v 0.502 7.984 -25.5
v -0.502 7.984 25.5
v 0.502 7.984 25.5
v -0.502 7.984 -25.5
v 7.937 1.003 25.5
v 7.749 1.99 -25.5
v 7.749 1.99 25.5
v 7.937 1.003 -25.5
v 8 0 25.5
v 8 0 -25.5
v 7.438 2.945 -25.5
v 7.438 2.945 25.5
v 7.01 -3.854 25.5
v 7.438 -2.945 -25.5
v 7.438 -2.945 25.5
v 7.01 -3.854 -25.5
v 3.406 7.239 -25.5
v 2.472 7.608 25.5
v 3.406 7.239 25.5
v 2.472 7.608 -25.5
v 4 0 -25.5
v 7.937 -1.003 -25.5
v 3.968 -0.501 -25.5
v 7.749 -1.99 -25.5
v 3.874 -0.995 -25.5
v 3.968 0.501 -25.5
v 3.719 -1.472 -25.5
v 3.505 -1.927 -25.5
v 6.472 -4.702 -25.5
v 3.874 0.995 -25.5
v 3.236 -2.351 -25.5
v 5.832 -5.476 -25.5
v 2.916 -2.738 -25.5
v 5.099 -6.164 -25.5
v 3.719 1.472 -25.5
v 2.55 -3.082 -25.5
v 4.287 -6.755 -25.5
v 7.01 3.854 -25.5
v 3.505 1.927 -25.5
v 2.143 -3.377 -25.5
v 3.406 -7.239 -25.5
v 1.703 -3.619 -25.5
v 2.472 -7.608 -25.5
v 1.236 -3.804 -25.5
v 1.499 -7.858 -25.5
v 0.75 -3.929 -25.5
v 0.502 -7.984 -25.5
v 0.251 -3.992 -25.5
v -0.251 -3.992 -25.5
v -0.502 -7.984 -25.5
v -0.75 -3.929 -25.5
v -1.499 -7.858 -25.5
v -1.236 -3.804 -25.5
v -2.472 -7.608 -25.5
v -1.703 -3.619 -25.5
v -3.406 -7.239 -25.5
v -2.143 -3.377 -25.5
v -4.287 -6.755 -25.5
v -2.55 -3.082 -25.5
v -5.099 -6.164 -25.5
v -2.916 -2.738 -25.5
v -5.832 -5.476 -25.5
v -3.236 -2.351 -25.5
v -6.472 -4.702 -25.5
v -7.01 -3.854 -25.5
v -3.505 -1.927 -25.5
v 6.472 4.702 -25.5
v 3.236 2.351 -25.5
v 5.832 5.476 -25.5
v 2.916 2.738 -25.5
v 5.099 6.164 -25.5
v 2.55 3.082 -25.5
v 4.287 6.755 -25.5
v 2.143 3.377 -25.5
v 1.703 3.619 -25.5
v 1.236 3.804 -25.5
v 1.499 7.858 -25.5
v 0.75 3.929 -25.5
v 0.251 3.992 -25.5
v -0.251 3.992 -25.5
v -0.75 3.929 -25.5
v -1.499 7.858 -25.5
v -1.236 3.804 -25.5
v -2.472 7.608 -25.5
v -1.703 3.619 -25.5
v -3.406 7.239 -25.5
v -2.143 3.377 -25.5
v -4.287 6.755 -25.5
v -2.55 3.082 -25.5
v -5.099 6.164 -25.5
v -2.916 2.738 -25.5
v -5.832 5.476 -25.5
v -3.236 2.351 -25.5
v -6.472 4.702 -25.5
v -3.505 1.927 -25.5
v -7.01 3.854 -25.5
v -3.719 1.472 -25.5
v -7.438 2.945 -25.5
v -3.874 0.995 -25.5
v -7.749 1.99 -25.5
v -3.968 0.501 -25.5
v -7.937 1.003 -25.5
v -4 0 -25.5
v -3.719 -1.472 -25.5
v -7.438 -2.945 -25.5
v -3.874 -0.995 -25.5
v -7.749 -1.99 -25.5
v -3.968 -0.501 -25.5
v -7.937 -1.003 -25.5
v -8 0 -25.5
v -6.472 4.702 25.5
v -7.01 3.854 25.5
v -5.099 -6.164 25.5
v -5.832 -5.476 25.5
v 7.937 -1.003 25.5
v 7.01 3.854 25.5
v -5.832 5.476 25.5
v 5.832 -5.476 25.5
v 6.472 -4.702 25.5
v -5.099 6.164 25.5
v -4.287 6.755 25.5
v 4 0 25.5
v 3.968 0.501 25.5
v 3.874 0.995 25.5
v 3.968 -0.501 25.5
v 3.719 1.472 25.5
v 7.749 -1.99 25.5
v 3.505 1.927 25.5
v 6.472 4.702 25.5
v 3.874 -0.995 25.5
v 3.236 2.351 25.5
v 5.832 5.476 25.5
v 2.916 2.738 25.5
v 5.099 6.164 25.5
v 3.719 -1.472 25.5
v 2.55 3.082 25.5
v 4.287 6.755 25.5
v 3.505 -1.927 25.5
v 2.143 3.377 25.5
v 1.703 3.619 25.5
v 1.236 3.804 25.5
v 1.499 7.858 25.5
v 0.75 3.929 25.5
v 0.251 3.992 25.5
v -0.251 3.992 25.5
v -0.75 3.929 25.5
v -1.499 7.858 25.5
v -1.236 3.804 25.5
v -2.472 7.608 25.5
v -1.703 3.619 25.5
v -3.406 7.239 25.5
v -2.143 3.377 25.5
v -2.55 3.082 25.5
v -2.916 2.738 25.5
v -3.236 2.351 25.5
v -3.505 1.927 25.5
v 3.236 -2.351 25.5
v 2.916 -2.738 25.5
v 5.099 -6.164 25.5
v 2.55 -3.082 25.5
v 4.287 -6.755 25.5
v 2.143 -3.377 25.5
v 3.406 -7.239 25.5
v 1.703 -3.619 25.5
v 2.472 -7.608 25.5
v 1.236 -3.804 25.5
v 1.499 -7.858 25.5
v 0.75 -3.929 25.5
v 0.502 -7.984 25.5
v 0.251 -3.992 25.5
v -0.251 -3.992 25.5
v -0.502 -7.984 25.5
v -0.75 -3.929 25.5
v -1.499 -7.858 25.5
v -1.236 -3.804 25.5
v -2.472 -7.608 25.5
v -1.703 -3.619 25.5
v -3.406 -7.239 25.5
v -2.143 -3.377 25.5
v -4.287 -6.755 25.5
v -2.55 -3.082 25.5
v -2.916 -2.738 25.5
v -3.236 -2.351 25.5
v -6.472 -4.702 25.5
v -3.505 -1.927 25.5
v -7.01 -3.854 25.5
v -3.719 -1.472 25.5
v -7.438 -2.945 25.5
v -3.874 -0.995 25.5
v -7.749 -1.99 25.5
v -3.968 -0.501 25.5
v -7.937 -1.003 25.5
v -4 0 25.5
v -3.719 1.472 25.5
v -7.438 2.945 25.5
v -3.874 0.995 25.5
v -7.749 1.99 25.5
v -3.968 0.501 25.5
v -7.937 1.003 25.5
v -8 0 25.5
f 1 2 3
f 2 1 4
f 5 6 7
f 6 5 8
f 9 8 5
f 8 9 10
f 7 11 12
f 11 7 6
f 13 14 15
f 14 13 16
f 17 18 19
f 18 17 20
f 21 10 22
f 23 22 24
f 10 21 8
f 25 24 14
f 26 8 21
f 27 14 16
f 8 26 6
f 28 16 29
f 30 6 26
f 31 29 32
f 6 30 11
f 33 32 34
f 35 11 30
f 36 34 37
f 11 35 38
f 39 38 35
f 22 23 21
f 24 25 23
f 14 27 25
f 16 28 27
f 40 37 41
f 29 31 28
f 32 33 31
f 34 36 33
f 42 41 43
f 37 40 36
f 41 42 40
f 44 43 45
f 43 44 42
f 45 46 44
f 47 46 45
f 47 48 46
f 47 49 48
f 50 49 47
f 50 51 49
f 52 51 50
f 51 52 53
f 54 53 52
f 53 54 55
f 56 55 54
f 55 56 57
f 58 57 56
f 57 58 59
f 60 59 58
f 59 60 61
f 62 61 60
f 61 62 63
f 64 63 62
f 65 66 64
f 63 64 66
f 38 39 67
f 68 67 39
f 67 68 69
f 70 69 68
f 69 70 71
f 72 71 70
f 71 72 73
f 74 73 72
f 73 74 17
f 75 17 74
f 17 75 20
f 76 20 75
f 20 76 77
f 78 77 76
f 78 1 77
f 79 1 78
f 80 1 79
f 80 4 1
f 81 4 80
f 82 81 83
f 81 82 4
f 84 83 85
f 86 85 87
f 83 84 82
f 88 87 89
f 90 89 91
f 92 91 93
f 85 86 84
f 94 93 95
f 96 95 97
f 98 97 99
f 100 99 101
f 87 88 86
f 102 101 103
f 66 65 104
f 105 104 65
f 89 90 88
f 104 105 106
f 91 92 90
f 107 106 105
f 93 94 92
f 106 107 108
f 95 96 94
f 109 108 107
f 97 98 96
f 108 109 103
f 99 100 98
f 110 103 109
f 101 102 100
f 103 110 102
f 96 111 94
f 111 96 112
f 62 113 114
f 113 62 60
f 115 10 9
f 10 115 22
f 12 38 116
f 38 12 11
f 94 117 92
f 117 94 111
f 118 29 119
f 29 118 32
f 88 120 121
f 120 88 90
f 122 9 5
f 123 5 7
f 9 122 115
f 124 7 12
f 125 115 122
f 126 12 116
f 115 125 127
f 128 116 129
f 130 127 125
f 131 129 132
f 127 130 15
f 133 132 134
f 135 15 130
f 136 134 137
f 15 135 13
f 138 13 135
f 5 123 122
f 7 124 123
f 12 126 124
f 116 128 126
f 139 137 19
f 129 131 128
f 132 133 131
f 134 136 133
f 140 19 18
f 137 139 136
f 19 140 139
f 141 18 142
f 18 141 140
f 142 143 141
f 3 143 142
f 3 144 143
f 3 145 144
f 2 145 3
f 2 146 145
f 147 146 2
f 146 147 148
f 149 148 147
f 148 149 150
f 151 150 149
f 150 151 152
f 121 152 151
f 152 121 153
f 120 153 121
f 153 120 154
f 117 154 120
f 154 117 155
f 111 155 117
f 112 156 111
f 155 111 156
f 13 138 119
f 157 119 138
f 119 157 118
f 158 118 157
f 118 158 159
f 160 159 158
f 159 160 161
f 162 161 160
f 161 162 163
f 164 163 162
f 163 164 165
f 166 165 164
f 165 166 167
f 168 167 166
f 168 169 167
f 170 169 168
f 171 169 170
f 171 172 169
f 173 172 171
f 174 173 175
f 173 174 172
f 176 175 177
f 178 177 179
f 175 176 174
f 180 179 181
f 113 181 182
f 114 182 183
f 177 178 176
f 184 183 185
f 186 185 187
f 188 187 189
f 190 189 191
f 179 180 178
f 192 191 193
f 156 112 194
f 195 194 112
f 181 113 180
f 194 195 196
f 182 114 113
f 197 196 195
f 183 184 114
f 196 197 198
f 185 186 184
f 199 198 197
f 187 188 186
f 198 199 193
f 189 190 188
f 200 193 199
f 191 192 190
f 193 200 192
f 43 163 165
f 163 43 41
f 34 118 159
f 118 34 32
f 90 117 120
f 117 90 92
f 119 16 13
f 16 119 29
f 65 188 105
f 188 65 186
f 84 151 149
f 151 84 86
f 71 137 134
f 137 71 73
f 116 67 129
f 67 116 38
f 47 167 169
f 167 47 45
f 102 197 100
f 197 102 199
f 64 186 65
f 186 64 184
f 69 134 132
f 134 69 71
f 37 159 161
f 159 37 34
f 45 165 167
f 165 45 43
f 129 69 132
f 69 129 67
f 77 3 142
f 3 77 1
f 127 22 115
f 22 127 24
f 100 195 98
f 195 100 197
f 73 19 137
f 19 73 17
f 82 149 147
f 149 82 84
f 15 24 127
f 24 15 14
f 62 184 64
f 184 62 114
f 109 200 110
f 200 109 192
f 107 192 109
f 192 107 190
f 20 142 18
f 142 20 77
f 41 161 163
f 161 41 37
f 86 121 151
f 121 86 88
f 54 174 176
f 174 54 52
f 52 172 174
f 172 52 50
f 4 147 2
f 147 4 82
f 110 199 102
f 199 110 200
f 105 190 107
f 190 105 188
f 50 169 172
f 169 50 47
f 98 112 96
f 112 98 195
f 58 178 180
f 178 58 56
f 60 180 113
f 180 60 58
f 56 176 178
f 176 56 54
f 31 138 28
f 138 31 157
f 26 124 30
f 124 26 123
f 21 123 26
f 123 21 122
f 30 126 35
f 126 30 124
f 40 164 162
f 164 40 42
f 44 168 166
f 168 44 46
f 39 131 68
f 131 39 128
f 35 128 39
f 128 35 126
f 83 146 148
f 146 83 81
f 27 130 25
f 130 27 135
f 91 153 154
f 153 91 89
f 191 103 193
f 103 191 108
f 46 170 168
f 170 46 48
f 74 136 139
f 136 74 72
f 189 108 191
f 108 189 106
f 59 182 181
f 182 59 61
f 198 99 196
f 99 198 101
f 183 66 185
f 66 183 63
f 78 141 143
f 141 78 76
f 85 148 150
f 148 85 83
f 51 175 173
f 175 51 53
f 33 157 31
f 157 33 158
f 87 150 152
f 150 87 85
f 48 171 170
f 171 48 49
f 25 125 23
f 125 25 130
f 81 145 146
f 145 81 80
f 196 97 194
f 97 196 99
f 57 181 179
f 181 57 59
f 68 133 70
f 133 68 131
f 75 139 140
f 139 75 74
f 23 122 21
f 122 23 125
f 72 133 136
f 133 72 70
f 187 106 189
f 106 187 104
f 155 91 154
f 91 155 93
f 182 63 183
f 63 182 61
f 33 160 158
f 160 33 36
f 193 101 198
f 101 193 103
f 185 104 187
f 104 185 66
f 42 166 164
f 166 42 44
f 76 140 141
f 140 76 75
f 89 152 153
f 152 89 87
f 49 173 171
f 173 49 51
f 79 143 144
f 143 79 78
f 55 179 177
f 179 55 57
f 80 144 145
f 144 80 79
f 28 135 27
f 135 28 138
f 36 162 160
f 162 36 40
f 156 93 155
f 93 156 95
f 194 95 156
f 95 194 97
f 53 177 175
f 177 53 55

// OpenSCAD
$fn = 50;


difference() {
	union() {
		translate(v = [0, 0, -25.5000000000]) {
			cylinder(h = 51, r = 8.0000000000);
		}
	}
	union() {
		translate(v = [0, 0, -100.0000000000]) {
			cylinder(h = 200, r = 4.0000000000);
		}
	}
}
